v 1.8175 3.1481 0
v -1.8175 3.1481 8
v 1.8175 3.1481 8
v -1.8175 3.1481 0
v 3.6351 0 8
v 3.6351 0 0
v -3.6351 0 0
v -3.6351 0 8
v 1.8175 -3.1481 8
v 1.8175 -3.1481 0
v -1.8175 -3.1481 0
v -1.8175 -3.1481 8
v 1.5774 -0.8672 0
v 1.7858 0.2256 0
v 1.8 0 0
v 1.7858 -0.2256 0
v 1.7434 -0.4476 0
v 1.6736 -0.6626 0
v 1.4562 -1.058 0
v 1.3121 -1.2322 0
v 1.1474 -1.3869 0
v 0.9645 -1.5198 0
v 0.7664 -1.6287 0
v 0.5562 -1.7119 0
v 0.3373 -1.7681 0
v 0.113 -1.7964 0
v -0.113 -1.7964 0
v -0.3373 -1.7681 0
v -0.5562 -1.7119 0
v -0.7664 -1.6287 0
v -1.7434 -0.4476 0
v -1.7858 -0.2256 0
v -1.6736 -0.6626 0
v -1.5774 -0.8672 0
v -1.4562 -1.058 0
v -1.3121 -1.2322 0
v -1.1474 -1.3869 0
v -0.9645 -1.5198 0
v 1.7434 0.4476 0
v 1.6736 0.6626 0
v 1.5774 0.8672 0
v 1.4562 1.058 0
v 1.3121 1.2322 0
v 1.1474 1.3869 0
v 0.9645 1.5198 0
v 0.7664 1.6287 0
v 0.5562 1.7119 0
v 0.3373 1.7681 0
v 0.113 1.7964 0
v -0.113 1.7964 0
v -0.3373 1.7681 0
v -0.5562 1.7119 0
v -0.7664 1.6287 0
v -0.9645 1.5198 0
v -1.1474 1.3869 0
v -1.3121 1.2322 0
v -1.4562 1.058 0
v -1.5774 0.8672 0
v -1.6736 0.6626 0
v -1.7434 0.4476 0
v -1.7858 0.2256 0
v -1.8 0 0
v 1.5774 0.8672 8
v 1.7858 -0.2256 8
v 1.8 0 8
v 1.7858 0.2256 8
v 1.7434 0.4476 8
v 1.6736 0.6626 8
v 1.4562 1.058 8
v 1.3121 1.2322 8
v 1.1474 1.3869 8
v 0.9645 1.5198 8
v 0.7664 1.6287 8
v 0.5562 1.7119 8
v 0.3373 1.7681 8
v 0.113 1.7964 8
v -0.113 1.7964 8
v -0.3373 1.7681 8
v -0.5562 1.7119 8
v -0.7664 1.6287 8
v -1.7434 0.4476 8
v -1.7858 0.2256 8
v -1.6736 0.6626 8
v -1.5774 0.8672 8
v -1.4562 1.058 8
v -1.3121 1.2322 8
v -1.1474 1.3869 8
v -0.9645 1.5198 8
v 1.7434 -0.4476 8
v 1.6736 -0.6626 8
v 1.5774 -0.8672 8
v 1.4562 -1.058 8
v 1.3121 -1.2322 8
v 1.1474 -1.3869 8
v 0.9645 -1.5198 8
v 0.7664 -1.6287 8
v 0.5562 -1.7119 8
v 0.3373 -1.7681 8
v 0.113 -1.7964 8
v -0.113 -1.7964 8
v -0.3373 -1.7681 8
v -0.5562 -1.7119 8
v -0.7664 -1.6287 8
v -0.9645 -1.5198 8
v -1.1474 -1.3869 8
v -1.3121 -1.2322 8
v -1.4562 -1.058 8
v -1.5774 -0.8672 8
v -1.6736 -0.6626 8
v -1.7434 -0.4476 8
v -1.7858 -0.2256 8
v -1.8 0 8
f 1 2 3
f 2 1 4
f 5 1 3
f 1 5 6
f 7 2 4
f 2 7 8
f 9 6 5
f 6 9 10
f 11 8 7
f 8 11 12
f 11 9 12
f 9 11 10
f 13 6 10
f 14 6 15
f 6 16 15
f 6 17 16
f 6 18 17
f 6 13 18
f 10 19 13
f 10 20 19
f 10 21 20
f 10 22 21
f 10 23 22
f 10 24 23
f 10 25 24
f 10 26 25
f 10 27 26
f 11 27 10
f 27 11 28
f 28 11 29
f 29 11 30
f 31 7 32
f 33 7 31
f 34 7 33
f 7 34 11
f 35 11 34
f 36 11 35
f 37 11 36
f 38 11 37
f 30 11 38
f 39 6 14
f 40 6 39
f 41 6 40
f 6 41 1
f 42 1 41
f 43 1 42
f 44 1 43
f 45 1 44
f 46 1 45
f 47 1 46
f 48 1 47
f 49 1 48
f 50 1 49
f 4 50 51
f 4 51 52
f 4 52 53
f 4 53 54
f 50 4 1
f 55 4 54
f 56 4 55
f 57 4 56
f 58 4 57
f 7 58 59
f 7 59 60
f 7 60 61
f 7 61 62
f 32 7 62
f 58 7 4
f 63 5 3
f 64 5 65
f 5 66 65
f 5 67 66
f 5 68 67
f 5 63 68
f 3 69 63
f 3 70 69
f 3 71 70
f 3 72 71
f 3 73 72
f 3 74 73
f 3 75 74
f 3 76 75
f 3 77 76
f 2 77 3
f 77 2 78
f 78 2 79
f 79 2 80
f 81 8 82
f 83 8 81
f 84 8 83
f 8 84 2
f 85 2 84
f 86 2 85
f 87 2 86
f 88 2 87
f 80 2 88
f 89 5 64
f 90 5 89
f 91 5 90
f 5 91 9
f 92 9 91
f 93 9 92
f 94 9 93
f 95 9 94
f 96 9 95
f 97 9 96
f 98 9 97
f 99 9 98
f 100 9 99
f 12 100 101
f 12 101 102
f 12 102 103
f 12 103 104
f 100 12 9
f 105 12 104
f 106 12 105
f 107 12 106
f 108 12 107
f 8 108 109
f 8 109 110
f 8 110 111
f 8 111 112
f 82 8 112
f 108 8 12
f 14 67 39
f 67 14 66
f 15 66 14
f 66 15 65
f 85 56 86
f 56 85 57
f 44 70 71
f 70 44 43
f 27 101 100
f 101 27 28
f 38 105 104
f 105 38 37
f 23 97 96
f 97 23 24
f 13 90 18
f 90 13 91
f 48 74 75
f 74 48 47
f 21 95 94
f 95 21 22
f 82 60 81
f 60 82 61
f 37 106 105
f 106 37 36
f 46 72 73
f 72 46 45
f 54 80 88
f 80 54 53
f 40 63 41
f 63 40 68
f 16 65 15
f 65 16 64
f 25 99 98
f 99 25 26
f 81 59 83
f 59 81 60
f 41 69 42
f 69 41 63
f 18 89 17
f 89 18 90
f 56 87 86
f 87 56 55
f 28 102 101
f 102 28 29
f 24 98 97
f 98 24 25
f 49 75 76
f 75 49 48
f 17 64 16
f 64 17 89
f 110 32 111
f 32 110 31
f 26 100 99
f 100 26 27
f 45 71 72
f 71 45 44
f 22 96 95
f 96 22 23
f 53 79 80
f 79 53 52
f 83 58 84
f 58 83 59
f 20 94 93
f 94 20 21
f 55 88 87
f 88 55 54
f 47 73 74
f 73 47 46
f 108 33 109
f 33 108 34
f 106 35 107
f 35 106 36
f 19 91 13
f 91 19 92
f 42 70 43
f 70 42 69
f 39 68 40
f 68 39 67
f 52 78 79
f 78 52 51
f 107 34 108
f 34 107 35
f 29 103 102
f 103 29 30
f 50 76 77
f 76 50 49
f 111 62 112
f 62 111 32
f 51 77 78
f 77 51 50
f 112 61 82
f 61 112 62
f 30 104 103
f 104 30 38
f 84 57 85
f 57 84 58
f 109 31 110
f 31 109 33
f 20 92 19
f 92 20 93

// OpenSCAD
$fn = 50;


difference() {
	union() {
		linear_extrude(height = 8) {
			polygon(points = [[3.6351000000, 0.0000000000], [1.8175500000, 3.1480889453], [-1.8175500000, 3.1480889453], [-3.6351000000, 0.0000000000], [-1.8175500000, -3.1480889453], [1.8175500000, -3.1480889453]]);
		}
	}
	union() {
		cylinder(h = 8, r = 1.8000000000);
	}
}
